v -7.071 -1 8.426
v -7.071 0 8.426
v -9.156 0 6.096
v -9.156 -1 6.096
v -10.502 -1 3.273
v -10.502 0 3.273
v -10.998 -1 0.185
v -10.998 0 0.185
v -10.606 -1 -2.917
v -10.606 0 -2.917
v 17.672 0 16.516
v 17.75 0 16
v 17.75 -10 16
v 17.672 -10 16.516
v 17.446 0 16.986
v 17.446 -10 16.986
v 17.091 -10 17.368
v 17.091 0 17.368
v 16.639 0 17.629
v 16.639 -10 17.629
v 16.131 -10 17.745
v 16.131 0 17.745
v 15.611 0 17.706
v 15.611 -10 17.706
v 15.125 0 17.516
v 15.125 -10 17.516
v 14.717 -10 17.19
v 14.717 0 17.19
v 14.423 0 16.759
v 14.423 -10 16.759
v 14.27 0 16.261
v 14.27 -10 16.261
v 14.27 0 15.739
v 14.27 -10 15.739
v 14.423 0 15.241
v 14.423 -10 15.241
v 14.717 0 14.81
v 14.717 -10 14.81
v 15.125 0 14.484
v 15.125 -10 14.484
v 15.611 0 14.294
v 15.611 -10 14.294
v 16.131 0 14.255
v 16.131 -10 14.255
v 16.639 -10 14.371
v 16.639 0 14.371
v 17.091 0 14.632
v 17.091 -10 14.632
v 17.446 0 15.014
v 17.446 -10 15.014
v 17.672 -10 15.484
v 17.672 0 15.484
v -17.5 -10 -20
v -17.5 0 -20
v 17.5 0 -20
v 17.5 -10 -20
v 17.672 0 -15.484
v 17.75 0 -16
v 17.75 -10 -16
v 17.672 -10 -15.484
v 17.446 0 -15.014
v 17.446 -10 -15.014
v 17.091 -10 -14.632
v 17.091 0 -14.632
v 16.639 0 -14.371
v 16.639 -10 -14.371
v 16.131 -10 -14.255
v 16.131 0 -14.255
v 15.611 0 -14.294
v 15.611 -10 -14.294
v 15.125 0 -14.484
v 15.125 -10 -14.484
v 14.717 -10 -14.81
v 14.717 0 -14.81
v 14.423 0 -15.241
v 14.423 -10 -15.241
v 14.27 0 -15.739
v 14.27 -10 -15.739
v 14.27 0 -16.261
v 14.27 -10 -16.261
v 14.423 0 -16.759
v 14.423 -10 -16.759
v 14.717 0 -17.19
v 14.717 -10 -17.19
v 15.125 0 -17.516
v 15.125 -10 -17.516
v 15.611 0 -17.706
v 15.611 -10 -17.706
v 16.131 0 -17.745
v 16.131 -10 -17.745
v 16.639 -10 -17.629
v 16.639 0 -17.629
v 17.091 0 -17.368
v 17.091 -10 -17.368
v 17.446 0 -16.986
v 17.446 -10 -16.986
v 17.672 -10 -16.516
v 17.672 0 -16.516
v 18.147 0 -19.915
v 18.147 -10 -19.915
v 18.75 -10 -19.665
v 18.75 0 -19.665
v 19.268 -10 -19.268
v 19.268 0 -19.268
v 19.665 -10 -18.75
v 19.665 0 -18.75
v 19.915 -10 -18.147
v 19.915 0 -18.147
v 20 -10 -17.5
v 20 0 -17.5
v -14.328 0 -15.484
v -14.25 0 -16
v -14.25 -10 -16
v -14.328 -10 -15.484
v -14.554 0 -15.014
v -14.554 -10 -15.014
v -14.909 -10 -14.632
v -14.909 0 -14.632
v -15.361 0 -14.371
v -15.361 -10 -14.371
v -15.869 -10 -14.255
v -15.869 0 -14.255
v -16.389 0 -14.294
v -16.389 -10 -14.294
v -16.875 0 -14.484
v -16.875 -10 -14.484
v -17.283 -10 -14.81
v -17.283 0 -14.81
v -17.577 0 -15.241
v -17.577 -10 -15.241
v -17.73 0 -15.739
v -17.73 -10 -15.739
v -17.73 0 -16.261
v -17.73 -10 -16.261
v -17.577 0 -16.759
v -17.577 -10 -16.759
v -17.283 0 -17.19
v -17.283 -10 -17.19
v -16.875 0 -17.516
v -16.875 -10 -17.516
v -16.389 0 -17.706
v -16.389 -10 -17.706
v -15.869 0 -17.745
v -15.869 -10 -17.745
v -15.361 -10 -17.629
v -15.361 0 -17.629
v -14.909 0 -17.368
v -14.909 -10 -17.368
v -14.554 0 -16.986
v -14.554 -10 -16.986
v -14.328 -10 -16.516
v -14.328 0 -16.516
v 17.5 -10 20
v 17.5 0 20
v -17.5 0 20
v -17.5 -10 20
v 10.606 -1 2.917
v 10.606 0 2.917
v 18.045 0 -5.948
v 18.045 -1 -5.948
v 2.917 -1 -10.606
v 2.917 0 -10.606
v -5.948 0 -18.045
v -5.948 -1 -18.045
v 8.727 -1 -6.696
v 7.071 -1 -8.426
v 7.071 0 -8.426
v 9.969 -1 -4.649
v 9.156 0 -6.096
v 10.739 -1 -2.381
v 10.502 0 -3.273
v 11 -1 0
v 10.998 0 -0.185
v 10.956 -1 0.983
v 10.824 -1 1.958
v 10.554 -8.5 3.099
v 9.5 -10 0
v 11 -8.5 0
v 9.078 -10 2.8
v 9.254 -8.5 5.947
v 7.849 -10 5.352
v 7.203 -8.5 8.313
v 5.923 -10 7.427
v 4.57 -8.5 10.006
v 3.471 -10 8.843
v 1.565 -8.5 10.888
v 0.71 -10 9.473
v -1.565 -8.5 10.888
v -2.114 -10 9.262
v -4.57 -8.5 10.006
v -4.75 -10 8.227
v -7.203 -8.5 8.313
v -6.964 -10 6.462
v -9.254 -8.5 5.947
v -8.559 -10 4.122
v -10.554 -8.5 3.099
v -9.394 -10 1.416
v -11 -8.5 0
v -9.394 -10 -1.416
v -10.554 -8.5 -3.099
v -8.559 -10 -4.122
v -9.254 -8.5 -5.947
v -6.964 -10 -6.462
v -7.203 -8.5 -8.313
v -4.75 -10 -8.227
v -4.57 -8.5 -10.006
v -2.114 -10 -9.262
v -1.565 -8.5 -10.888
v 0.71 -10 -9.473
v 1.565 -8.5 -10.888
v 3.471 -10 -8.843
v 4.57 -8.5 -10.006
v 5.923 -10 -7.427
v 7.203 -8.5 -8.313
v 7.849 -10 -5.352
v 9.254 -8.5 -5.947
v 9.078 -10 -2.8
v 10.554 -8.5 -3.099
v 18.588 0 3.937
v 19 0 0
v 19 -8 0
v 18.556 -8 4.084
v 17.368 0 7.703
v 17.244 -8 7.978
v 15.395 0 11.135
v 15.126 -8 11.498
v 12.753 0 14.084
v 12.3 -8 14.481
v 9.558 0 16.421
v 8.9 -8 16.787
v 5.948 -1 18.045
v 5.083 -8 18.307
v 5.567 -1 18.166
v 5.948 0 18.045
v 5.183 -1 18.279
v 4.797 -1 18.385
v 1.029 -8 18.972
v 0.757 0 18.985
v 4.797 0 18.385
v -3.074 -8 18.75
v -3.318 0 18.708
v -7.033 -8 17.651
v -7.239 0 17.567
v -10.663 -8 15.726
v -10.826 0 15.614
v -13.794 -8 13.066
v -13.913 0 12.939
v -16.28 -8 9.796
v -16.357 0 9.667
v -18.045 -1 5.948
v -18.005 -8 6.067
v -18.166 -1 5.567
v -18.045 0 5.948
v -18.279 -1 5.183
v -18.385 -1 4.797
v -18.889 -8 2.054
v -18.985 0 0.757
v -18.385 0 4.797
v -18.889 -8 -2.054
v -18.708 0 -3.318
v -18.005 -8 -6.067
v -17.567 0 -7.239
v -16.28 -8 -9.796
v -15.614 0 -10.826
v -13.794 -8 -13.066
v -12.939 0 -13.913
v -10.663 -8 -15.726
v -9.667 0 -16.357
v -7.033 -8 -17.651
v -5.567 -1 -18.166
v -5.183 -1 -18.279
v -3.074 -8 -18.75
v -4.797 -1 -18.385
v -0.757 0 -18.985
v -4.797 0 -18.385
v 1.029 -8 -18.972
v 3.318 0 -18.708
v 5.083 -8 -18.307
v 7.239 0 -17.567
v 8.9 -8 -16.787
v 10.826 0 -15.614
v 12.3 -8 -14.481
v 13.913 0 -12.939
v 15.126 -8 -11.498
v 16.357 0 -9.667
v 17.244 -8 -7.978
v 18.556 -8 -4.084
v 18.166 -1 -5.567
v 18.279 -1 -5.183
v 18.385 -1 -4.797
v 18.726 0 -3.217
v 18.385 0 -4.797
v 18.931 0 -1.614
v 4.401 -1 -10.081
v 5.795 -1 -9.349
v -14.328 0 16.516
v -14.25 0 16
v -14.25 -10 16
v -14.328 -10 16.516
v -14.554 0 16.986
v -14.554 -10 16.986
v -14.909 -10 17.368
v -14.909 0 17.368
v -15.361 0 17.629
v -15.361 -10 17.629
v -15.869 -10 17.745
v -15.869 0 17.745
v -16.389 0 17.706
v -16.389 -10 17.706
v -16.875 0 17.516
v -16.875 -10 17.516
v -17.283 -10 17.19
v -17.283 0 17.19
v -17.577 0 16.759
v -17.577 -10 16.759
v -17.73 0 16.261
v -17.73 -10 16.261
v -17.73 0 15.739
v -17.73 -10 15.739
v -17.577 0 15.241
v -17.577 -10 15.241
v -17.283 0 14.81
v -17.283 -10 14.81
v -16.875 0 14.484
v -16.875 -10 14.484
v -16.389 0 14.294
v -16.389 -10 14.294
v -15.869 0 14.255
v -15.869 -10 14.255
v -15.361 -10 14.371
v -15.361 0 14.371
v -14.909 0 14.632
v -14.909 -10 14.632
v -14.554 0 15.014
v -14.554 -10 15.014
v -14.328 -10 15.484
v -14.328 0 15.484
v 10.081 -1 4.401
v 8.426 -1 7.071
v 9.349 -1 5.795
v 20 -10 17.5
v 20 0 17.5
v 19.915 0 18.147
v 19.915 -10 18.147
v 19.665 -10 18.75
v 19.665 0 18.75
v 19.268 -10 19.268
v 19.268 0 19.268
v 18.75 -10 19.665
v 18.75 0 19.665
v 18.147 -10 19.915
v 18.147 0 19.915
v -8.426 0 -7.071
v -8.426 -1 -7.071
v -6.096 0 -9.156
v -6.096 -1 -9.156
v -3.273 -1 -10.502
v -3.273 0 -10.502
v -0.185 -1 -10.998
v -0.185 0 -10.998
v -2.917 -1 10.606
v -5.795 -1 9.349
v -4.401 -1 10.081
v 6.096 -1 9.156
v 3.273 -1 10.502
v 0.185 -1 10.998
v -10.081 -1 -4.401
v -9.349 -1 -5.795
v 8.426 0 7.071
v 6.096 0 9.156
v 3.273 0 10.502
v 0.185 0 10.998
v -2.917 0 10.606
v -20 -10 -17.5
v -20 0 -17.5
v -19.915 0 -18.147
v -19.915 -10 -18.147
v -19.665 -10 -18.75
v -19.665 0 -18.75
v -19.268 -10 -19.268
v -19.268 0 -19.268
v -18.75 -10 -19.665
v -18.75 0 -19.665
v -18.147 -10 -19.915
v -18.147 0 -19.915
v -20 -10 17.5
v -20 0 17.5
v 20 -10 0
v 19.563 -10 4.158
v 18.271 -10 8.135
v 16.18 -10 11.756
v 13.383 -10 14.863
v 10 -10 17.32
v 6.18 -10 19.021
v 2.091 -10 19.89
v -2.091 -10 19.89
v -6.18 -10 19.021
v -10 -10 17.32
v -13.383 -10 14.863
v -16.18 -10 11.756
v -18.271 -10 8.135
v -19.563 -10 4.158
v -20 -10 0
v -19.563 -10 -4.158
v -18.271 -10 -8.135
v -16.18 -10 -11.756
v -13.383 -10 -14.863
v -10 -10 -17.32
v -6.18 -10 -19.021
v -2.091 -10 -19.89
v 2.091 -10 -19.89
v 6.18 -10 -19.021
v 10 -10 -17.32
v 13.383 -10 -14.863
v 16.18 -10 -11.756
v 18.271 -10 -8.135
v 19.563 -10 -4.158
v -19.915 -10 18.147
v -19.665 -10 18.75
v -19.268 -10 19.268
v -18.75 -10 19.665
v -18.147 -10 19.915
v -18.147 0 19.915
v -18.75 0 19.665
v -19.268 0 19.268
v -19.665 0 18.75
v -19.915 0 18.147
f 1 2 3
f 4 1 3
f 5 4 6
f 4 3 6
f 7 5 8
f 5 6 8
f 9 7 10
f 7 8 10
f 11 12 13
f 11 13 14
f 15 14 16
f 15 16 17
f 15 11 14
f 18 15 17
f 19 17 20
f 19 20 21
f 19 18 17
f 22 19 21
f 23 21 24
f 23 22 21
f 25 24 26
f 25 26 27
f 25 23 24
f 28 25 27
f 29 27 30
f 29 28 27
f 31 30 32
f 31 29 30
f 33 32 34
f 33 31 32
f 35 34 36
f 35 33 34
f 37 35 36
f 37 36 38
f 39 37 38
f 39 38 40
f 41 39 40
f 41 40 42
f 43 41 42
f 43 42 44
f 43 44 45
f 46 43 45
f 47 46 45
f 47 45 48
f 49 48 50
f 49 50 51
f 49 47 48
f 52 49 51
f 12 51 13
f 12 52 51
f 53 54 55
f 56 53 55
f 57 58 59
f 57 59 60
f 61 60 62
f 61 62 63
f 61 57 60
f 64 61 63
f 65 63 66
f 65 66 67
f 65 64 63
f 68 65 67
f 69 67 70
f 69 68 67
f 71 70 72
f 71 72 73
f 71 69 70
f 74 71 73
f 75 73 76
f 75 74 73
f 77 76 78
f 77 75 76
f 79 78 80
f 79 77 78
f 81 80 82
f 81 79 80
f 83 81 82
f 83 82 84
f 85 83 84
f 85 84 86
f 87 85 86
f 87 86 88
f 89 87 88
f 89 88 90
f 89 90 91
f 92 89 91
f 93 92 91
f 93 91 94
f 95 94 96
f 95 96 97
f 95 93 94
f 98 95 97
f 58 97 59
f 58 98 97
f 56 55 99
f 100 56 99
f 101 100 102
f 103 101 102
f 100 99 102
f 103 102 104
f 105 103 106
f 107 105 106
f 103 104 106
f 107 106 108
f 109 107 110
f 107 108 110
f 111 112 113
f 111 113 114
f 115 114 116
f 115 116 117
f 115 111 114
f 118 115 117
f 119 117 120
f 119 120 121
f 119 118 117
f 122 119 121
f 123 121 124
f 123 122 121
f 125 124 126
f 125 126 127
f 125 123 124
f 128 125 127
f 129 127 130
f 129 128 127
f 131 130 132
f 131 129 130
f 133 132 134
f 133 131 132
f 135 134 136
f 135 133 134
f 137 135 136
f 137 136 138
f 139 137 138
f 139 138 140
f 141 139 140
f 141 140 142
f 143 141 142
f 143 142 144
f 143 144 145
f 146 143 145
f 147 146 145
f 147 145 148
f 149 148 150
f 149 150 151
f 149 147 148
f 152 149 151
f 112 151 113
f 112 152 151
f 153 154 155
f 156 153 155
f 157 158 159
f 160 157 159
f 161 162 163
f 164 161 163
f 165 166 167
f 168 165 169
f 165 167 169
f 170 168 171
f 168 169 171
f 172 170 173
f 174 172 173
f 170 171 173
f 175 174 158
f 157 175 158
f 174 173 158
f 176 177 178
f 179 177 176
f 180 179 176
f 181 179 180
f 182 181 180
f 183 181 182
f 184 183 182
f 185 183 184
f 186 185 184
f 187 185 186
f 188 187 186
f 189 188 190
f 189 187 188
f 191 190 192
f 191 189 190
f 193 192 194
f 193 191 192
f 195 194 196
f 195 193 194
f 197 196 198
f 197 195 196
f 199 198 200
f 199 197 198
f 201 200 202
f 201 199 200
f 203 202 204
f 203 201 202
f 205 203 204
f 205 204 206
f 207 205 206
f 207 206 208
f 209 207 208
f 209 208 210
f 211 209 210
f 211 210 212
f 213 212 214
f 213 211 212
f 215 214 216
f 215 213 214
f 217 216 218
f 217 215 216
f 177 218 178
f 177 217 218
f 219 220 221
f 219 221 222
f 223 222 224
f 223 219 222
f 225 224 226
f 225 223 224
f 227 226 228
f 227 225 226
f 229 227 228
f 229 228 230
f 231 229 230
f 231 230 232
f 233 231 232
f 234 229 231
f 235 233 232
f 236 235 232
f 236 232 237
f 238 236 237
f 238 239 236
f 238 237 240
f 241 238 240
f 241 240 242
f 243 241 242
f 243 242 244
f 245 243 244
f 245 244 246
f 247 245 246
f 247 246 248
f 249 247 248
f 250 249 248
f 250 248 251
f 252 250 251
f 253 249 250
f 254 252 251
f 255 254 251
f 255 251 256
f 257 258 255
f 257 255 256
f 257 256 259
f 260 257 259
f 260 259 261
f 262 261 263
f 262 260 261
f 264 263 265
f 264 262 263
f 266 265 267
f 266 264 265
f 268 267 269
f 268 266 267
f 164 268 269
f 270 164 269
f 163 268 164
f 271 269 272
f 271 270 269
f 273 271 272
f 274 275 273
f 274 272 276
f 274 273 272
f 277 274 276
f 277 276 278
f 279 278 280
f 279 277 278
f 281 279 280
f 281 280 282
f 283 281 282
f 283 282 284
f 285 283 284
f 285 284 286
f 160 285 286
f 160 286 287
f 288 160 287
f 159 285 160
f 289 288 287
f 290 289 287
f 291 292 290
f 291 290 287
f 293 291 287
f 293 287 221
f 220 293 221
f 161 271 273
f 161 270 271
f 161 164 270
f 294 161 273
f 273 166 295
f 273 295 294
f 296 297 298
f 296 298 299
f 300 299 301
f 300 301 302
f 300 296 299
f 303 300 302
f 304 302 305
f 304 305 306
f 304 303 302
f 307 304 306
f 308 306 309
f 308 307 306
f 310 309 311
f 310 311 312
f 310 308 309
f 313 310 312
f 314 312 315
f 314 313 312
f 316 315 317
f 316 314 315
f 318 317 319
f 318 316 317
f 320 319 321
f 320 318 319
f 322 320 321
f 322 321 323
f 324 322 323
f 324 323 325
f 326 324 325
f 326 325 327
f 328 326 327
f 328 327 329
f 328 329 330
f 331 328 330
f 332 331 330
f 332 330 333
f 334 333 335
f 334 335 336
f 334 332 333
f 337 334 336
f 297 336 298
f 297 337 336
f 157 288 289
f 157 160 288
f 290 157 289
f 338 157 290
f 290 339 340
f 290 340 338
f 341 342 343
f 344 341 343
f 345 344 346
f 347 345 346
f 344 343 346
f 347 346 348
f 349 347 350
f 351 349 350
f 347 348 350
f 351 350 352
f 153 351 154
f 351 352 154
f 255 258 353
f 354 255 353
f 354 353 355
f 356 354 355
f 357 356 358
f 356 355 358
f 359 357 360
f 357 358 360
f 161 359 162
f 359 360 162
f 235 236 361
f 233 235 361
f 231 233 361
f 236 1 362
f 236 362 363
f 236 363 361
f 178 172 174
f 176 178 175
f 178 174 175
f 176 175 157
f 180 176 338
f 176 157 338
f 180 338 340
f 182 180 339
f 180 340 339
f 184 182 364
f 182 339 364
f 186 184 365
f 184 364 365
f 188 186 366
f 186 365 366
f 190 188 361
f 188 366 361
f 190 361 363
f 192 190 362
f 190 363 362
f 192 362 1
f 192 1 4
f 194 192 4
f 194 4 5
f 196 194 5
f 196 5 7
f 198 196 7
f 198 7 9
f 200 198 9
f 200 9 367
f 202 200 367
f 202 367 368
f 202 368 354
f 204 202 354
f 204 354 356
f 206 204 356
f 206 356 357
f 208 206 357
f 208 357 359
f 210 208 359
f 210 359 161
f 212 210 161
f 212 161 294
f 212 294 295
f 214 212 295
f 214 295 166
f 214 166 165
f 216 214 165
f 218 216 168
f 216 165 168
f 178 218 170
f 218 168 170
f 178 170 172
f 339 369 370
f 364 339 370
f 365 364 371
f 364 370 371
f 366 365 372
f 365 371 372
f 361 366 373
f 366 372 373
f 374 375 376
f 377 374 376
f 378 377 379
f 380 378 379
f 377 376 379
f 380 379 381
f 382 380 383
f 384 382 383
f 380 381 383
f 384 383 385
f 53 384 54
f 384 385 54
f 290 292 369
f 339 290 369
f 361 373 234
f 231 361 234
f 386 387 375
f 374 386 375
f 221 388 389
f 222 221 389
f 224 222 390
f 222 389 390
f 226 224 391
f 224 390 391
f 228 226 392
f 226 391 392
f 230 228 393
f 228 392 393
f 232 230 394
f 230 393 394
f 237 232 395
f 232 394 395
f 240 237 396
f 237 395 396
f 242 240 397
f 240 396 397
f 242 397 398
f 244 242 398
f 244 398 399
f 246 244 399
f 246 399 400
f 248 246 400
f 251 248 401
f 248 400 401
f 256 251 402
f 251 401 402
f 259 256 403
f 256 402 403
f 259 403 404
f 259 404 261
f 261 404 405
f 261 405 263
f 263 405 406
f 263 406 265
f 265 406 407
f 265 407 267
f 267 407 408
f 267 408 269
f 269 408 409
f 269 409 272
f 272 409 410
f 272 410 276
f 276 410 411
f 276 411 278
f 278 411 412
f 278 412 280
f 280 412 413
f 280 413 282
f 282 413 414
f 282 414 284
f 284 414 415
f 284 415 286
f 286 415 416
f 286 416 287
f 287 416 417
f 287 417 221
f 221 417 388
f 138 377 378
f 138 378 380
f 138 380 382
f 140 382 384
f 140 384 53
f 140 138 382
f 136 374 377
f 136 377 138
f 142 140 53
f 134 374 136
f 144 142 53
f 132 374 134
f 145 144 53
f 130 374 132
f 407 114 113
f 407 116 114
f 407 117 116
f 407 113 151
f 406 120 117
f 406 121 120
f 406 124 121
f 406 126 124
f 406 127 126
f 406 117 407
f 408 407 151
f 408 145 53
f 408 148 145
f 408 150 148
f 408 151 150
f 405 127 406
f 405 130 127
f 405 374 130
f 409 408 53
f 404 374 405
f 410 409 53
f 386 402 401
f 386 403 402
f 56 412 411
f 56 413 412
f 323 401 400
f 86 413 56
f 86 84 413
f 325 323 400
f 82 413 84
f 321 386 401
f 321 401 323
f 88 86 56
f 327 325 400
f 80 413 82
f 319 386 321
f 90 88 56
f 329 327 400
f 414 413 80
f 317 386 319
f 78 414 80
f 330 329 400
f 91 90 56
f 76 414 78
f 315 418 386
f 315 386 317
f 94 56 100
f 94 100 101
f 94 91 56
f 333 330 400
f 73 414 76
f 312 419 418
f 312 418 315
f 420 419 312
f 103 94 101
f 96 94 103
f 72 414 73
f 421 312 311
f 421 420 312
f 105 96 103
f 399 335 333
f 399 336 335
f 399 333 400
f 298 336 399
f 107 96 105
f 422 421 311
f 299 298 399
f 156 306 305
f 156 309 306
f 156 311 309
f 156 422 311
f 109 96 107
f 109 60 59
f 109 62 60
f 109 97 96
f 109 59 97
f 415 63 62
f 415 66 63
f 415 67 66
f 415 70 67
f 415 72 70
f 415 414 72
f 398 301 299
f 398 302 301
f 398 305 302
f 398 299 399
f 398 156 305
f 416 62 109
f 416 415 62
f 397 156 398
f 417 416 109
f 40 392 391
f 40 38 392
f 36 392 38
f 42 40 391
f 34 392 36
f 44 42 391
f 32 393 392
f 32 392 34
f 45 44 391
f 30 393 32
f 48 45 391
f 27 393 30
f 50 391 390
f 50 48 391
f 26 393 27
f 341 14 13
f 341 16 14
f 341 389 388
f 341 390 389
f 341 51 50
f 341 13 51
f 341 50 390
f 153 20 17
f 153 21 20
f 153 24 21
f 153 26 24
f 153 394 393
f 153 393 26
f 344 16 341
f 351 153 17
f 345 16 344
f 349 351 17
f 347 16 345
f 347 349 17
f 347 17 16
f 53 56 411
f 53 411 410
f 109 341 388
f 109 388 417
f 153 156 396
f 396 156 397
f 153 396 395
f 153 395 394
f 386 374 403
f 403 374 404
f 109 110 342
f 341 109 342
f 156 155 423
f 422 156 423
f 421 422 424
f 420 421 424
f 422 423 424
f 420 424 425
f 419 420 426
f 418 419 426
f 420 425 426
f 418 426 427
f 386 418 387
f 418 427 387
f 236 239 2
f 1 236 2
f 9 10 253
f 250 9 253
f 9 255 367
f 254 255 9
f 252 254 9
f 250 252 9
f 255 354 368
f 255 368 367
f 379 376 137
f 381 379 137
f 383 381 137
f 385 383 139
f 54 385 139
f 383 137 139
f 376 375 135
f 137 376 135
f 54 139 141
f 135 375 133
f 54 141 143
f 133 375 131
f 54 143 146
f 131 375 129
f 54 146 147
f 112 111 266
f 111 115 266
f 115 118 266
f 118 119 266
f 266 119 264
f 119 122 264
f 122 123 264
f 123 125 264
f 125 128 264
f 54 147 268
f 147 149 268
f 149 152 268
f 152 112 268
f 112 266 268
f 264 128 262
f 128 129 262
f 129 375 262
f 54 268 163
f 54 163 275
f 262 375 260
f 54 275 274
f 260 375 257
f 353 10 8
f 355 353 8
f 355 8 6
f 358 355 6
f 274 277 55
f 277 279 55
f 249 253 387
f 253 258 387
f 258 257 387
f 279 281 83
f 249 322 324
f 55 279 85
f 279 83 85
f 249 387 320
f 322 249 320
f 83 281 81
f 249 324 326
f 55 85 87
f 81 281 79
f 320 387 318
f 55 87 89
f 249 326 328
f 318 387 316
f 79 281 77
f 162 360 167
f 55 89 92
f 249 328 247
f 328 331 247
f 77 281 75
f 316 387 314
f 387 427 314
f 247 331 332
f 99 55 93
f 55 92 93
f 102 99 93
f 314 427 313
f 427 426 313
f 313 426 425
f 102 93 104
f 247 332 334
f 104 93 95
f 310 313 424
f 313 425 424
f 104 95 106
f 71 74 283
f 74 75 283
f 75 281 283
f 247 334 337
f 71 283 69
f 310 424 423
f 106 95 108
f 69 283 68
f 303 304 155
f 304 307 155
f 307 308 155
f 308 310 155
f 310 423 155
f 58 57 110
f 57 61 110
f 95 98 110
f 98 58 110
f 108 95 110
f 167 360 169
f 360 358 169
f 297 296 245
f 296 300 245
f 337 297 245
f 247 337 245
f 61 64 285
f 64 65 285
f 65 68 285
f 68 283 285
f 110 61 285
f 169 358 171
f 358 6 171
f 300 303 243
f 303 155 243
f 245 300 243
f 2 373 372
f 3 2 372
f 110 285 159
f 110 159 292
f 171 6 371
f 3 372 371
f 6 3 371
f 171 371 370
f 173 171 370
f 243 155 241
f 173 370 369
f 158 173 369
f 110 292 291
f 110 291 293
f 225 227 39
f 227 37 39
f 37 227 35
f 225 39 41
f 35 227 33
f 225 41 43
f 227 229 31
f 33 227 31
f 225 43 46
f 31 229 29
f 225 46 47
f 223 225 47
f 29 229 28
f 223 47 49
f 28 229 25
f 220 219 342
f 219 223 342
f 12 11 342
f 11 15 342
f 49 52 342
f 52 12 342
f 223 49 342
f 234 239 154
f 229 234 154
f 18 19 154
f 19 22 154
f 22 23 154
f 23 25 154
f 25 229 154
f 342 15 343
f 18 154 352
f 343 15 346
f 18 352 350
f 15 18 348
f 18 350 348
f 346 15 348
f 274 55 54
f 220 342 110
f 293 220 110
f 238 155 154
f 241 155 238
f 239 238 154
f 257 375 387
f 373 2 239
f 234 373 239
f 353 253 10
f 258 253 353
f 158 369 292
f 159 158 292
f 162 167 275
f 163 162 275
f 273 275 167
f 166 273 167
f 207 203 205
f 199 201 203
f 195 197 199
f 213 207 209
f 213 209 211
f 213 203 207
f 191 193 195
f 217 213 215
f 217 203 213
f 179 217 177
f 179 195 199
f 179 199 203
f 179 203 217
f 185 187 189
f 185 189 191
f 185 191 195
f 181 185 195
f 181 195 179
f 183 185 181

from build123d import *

# Parameters (mm, degrees)
F0_R     = 1.75
F0_R_2   = 19
F1_DEPTH = 10
F3_DEPTH = 1
F4_R     = 11
F5_DEPTH = 9
F7_SIZE2 = 0.99999
F7_SIZE  = 1.99999


# Not quite as in the source:
# - a fillet or chamfer that OpenCascade refuses, or shapes differently, is made with other operations: its cross-section is extruded or revolved along the edge and cut away or added
# - a fillet or chamfer is up to 0.001 mm smaller than in the source, because OpenCascade refuses the exact size


with BuildPart() as f1:
    # F0 (on Front) → F1 (new body)
    with BuildSketch(Plane.XZ):
        with BuildLine():
            Line((-17.5, -20), (17.5, -20))
            ThreePointArc((17.5, -20), (19.267766953, -19.267766953), (20, -17.5))
            Line((20, -17.5), (20, 17.5))
            ThreePointArc((20, 17.5), (19.267766953, 19.267766953), (17.5, 20))
            Line((17.5, 20), (-17.5, 20))
            ThreePointArc((-17.5, 20), (-19.267766953, 19.267766953), (-20, 17.5))
            Line((-20, 17.5), (-20, -17.5))
            ThreePointArc((-20, -17.5), (-19.267766953, -19.267766953), (-17.5, -20))
        make_face()
        with Locations((-16, -16)):
            Circle(F0_R, mode=Mode.SUBTRACT)
        with Locations((16, -16)):
            Circle(F0_R, mode=Mode.SUBTRACT)
        with Locations((-16, 16)):
            Circle(F0_R, mode=Mode.SUBTRACT)
        Circle(F0_R_2, mode=Mode.SUBTRACT)
        with Locations((16, 16)):
            Circle(F0_R, mode=Mode.SUBTRACT)
    extrude(amount=F1_DEPTH)

    # F2 (on Front) → F3 (join)
    with BuildSketch(Plane.XZ):
        with BuildLine():
            Line((5.6323262572, 19.0855630677), (-7.0706637066, 8.4264888743))
            ThreePointArc((-7.0706637066, 8.4264888743), (-10.5017983633, 3.2729544964), (-10.6060673084, -2.9174194506))
            Line((-10.6060673084, -2.9174194506), (-18.3195186246, 6.2751138669))
            Line((-18.3195186246, 6.2751138669), (-19.0855630677, 5.6323262572))
            Line((-19.0855630677, 5.6323262572), (-8.4264888743, -7.0706637066))
            ThreePointArc((-8.4264888743, -7.0706637066), (-3.2729544964, -10.5017983633), (2.9174194506, -10.6060673084))
            Line((2.9174194506, -10.6060673084), (-6.2751138669, -18.3195186246))
            Line((-6.2751138669, -18.3195186246), (-5.6323262572, -19.0855630677))
            Line((-5.6323262572, -19.0855630677), (7.0706637066, -8.4264888743))
            ThreePointArc((7.0706637066, -8.4264888743), (10.5017983633, -3.2729544964), (10.6060673084, 2.9174194506))
            Line((10.6060673084, 2.9174194506), (18.3195186246, -6.2751138669))
            Line((18.3195186246, -6.2751138669), (19.0855630677, -5.6323262572))
            Line((19.0855630677, -5.6323262572), (8.4264888743, 7.0706637066))
            ThreePointArc((8.4264888743, 7.0706637066), (3.2729544964, 10.5017983633), (-2.9174194506, 10.6060673084))
            Line((-2.9174194506, 10.6060673084), (6.2751138669, 18.3195186246))
            Line((6.2751138669, 18.3195186246), (5.6323262572, 19.0855630677))
        make_face()
    extrude(amount=F3_DEPTH)

    # F4 (on face) → F5 (join)
    with BuildSketch(Plane.XZ.offset(1)):
        Circle(F4_R)
    extrude(amount=F5_DEPTH)

    # F6: chamfer of 1.5 on 1 edges, made by hand

    # F6_s1 → F6_t2 (revolve, cut)
    with BuildSketch(Plane.XY):
        Polygon((11, -8.5), (9.5, -10), (11, -10), align=None)
    revolve(axis=Axis((0, -10, 0), (0, -1, 0)), mode=Mode.SUBTRACT)

    # F7 (size 2 and 1 in the source; OpenCascade refuses exactly that, so slightly less here)
    f7_edges = [f1.edges().sort_by_distance(p)[0] for p in [
        (-19, -10, 0),
    ]]
    f7_side = f1.faces().sort_by_distance((-19, -5, 0))[0]
    chamfer(f7_edges, length=F7_SIZE, length2=F7_SIZE2, reference=f7_side)


solid = f1.part
